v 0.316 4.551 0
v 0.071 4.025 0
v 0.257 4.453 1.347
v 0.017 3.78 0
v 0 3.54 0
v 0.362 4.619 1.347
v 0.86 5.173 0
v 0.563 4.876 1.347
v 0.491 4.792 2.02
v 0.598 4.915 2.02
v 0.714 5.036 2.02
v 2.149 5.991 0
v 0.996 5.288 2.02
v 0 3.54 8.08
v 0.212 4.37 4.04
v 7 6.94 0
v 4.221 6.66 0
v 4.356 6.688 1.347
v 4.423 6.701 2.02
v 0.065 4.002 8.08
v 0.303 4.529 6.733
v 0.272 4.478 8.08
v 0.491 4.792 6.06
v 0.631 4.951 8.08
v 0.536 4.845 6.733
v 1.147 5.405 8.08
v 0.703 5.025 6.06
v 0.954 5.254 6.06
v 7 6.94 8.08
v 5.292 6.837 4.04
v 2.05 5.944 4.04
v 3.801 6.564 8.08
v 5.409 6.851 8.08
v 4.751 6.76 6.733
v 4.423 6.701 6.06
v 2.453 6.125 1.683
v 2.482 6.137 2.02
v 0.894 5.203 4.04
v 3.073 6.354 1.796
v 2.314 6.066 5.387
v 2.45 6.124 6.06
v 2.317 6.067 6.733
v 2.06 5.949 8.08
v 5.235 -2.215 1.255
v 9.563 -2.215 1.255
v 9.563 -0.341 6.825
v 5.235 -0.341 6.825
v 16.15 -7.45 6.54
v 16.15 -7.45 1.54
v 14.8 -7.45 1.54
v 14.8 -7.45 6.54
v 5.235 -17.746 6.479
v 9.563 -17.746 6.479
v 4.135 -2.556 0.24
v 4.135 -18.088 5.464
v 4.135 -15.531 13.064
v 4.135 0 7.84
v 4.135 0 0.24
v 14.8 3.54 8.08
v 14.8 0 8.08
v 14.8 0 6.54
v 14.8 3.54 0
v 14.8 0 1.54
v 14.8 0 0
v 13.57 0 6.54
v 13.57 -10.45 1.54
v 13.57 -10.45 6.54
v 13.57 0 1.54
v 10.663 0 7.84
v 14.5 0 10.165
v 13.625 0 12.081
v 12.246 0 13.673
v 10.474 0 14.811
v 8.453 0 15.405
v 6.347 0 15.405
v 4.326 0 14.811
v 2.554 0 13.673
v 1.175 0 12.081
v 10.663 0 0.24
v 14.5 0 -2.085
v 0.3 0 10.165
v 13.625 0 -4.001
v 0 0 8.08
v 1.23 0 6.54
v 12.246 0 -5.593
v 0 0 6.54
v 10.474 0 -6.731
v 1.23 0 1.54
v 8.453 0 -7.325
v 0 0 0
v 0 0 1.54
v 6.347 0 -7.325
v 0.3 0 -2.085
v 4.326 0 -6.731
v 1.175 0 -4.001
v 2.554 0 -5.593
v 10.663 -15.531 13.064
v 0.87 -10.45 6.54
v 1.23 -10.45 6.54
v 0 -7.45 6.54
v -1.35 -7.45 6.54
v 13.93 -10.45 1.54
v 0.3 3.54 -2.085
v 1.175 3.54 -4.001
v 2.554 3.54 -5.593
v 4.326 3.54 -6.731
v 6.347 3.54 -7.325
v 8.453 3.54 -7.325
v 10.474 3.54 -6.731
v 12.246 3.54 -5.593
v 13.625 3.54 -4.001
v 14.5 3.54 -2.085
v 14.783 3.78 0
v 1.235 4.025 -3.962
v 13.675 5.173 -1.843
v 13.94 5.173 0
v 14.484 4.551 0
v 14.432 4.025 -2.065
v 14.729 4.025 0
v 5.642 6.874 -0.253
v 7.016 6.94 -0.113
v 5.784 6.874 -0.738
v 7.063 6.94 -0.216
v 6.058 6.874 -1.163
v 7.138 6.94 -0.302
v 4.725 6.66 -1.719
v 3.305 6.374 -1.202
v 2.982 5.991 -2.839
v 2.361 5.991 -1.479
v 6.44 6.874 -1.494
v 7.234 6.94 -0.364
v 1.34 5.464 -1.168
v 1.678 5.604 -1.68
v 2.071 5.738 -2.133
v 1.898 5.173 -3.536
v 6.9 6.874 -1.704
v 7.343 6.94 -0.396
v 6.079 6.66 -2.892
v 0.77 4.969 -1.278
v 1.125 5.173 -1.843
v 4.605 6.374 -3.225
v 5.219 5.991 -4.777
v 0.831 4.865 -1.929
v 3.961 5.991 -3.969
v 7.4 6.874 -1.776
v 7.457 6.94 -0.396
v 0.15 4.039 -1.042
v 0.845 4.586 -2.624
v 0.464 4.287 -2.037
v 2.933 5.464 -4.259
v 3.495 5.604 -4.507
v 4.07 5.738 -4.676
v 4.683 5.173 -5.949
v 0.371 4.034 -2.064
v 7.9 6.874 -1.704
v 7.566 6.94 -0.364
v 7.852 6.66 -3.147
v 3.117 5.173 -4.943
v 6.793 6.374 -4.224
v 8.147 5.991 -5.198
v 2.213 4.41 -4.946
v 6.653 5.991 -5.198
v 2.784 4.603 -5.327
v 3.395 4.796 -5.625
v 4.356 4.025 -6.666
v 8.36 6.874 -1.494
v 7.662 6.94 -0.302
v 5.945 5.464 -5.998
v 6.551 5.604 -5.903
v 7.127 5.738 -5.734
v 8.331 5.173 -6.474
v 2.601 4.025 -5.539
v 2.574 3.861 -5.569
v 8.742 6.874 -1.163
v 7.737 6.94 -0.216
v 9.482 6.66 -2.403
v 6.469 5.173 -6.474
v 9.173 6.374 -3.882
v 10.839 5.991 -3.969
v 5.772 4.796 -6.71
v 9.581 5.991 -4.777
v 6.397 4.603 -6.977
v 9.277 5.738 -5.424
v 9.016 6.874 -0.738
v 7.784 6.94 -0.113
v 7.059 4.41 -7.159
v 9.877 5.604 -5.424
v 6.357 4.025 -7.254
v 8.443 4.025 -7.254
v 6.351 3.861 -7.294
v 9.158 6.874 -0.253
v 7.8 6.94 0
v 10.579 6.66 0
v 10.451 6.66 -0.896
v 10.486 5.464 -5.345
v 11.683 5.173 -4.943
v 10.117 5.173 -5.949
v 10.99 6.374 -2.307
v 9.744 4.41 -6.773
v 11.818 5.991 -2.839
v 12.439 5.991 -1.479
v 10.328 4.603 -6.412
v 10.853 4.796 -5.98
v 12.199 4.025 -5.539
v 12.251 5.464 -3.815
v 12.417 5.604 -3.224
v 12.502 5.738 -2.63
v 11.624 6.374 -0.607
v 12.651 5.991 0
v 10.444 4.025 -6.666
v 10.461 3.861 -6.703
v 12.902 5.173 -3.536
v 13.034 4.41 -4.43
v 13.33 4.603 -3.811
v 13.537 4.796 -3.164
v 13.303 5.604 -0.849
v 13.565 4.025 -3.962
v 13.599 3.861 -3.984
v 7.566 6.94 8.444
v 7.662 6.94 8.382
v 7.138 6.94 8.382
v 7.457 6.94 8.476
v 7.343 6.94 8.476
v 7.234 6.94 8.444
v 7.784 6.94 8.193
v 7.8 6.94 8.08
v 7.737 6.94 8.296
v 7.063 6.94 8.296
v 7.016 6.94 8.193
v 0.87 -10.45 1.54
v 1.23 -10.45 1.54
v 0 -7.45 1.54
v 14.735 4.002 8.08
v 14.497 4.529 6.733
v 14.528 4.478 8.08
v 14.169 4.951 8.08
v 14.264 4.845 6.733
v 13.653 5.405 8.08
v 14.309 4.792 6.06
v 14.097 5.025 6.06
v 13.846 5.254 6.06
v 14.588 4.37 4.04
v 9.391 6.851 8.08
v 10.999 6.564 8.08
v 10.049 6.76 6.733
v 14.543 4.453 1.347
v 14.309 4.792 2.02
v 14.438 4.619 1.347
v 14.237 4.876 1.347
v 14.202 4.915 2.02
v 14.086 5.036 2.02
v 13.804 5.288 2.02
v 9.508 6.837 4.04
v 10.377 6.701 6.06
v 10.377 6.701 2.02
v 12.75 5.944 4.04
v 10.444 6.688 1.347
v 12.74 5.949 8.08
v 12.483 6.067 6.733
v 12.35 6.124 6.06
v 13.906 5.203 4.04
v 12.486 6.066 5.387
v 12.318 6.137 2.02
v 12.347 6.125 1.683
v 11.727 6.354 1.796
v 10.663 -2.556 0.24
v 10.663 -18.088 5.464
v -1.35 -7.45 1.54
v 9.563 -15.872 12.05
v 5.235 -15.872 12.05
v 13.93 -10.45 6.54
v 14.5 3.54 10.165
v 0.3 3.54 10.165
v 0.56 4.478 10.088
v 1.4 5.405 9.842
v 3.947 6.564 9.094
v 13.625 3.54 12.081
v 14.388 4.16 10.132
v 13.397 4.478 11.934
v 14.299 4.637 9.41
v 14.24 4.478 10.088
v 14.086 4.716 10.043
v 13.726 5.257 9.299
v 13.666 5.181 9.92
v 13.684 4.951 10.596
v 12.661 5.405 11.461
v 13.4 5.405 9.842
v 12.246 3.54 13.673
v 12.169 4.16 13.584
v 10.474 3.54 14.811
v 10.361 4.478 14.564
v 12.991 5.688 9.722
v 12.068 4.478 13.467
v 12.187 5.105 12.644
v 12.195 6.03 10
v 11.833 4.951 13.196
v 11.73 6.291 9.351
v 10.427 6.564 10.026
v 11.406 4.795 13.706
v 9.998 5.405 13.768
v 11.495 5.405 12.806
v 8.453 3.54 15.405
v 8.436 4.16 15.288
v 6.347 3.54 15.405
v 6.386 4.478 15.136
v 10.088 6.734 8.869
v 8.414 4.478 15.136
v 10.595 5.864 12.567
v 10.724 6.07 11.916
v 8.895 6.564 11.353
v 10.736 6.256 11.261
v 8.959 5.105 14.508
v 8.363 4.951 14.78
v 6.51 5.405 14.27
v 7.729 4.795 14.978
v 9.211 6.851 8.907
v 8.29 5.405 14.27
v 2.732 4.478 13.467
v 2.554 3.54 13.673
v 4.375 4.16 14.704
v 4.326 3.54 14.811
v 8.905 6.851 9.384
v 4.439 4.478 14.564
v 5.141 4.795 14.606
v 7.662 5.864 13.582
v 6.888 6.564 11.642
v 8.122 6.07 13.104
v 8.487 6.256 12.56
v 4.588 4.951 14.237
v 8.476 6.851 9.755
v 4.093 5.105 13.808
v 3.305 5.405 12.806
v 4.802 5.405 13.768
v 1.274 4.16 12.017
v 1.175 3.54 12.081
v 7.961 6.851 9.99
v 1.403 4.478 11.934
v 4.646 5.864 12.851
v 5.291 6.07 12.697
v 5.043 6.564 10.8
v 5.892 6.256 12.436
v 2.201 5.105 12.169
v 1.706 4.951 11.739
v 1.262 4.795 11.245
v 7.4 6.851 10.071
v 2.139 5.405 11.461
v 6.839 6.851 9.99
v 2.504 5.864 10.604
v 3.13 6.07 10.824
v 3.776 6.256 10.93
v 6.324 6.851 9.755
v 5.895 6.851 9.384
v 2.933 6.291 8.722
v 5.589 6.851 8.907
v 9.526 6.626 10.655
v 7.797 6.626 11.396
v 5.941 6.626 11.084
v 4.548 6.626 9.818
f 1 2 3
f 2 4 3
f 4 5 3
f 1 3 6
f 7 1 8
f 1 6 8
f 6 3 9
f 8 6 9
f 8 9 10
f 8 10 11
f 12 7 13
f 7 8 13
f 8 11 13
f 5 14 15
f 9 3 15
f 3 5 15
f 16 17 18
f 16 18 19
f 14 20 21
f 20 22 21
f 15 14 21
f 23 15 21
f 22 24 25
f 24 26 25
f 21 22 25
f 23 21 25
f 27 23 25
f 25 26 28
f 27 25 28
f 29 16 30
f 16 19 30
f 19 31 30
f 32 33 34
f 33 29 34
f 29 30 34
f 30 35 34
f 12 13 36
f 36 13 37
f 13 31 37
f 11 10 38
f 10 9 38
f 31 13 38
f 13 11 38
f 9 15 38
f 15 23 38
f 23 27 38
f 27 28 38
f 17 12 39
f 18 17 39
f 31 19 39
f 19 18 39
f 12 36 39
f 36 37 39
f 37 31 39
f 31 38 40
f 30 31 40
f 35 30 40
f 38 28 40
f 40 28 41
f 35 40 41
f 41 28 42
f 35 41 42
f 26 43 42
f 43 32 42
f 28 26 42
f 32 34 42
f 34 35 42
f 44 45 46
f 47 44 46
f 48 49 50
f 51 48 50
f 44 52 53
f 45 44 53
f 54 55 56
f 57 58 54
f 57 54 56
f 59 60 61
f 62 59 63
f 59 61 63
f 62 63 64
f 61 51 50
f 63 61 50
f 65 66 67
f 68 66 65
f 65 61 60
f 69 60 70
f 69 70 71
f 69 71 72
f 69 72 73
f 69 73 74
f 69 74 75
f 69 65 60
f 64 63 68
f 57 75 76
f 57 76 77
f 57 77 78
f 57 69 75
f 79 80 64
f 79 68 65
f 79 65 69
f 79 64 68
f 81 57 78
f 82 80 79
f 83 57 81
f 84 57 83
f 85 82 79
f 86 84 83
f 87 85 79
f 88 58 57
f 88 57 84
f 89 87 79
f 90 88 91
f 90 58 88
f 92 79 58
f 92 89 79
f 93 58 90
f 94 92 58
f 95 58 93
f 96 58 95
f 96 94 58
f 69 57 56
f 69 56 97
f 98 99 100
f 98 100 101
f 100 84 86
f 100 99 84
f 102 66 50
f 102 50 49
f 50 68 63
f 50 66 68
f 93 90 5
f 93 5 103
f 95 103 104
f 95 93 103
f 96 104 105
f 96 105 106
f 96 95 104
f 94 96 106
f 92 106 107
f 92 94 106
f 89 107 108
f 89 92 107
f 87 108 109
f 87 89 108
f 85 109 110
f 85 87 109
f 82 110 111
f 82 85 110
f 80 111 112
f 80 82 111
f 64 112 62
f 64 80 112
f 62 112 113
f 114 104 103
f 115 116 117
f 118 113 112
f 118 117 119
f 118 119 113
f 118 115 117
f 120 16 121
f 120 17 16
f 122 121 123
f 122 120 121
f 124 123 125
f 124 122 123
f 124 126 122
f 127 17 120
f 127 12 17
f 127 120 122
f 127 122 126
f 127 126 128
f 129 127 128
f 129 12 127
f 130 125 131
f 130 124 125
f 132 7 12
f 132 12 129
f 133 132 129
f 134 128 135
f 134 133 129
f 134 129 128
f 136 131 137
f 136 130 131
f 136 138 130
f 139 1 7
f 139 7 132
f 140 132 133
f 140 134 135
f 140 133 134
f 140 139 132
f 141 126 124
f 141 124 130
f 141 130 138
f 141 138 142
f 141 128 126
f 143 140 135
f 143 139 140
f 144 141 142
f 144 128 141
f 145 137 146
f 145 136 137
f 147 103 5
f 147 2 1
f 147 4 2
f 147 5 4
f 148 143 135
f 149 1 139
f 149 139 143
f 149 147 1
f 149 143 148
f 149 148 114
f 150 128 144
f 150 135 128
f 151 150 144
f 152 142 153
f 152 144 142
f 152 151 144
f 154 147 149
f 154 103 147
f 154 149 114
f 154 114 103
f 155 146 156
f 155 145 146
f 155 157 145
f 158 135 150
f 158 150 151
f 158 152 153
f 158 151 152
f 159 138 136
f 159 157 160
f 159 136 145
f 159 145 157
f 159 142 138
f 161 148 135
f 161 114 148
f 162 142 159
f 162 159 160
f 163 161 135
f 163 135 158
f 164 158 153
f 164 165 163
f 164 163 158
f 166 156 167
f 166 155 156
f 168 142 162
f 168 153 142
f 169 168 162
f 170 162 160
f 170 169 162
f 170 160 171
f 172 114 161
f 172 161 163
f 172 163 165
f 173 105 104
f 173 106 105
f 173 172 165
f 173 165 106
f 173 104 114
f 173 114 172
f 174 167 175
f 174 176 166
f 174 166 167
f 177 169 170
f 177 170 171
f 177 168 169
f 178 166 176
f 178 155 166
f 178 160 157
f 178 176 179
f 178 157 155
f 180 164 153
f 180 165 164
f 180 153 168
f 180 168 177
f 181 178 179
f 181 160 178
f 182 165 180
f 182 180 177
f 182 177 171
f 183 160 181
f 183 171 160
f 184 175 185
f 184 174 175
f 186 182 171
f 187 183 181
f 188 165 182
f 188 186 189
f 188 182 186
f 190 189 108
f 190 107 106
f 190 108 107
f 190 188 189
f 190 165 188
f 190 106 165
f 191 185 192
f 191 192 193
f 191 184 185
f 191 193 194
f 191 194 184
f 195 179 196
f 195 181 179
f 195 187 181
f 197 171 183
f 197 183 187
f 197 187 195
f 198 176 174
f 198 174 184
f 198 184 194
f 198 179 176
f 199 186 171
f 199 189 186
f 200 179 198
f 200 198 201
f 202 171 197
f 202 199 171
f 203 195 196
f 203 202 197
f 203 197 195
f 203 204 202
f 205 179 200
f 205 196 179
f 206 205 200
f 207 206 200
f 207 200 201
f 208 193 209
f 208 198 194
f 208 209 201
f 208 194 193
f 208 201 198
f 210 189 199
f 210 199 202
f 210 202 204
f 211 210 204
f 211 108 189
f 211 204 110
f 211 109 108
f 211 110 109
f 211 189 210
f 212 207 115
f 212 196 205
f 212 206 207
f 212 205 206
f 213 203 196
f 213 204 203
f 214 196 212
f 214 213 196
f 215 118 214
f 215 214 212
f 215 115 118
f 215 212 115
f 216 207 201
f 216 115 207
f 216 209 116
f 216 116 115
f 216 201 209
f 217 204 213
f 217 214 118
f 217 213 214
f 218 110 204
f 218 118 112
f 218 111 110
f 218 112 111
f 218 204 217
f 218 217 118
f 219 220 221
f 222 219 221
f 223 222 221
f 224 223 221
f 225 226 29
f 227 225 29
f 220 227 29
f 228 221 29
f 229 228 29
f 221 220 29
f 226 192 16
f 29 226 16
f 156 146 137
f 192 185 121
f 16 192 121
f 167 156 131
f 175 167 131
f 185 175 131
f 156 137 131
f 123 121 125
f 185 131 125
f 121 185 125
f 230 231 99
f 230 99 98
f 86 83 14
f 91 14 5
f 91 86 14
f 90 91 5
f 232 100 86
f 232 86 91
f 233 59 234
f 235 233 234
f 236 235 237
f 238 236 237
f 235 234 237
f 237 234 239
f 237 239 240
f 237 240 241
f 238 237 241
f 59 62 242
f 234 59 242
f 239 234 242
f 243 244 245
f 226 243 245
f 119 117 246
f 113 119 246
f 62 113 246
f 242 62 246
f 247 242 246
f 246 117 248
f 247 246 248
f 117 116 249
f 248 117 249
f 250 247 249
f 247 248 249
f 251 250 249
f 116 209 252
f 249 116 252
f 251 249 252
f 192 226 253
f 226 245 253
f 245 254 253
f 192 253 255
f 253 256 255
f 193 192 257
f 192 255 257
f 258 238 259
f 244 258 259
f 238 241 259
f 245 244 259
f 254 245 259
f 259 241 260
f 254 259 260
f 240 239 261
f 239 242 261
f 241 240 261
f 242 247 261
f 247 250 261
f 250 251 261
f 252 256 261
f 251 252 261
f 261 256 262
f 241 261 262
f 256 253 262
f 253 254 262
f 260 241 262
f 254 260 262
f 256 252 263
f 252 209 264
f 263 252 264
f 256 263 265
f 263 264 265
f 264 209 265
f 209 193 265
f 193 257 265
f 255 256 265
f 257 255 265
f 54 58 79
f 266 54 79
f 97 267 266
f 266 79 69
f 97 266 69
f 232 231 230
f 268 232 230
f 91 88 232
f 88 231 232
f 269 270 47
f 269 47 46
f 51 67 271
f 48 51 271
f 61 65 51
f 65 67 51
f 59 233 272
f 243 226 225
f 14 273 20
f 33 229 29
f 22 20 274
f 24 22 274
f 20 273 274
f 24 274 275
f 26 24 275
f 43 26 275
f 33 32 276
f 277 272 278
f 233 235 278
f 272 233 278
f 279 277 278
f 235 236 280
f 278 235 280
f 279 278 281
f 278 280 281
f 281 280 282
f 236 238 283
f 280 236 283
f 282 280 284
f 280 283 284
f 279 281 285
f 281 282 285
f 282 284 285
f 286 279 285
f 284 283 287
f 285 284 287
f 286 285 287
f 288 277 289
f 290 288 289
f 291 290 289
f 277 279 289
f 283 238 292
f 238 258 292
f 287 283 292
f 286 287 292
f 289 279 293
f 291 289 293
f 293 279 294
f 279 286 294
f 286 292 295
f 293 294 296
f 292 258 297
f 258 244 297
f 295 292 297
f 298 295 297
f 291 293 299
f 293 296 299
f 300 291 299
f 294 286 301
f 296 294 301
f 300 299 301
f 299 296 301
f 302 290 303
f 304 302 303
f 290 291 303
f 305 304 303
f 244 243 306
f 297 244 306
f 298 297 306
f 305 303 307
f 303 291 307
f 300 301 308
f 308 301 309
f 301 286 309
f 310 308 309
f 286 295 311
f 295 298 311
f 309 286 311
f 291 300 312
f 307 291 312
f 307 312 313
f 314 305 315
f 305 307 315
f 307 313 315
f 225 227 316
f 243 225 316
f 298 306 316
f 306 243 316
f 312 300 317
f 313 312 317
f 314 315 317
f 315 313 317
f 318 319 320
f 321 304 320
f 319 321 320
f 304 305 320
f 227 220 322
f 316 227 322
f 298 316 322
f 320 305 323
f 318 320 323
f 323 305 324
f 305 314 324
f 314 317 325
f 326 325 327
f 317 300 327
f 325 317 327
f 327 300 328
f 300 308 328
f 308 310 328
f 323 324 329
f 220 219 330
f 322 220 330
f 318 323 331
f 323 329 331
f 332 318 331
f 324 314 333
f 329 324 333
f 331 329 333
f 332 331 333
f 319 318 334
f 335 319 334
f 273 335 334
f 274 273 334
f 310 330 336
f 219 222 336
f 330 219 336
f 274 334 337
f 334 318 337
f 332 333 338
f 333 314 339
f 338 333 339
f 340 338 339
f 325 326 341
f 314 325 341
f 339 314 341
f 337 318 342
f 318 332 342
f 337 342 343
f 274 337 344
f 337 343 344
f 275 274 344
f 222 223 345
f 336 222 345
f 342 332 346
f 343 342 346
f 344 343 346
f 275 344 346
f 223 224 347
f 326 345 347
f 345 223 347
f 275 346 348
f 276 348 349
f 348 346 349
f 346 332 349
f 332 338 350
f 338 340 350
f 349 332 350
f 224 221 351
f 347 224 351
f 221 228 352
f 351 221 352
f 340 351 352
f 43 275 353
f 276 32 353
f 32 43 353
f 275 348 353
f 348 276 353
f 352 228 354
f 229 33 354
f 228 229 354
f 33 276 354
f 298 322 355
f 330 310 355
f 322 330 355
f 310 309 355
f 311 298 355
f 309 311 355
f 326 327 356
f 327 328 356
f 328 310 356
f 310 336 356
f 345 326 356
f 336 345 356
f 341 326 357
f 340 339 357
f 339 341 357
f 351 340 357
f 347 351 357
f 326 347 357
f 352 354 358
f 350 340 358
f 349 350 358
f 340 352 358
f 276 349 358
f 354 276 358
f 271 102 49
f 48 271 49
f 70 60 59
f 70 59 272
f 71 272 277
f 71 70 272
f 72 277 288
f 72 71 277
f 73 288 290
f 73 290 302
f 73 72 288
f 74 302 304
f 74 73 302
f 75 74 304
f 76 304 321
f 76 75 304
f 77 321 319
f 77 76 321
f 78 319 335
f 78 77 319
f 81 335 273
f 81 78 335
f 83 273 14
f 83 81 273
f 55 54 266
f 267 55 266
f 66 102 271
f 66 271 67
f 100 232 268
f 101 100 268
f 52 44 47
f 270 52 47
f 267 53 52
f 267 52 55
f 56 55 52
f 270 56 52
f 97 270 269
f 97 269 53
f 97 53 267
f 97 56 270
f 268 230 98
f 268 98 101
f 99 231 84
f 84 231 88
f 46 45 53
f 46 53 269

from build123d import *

# Parameters (mm, degrees)
SKETCH1_W           = 14.8
SKETCH1_H           = 8.08
BOSS_EXTRUDE1_DEPTH = 6.94
FILLET1_SIZE        = 7
FILLET1_SIZE_2      = 3.4
SKETCH2_W           = 2.5
SKETCH2_H           = 5
BOSS_EXTRUDE2_DEPTH = 7.45
SKETCH3_W           = 4.44
SKETCH3_H           = 5
BOSS_EXTRUDE3_DEPTH = 3
CUT_EXTRUDE1_REACH  = 26.161
CUT_EXTRUDE2_REACH  = 26.161
CUT_EXTRUDE3_REACH  = 25.756
SKETCH6_W           = 1.27
SKETCH6_H           = 10.45
SKETCH7_W           = 6.5278
SKETCH7_H           = 5
SKETCH7_H_2         = 1.3
BOSS_EXTRUDE4_DEPTH = 2.55634
CUT_EXTRUDE4_REACH  = 24.207
SKETCH9_W           = 6.5278
SKETCH9_H           = 8.018408457
SKETCH9_W_2         = 4.3283
SKETCH9_H_2         = 5.8777
BOSS_EXTRUDE5_DEPTH = 16.3863


with BuildPart() as part:
    # Sketch1 → Boss-Extrude1 (new body)
    with BuildSketch(Plane(origin=(0, 0, 0), x_dir=(1, 0, 0), z_dir=(0, 1, 0))):
        with BuildLine():
            Line((0, -8.08), (14.8, -8.08))
            ThreePointArc((14.8, -8.08), (7.4, -15.48), (0, -8.08))
        make_face()
        with Locations((7.4, -4.04)):
            Rectangle(SKETCH1_W, SKETCH1_H)
        with BuildLine():
            ThreePointArc((0, 0), (7.4, 7.4), (14.8, 0))
            Line((14.8, 0), (0, 0))
        make_face()
    extrude(amount=BOSS_EXTRUDE1_DEPTH)

    # Fillet1
    # an asymmetric fillet: 7, 3.4 mm, written as the material it takes off along each edge
    with BuildSketch(Plane(origin=(7.4, 6.94, 0), x_dir=(-1, 0, 0), z_dir=(0, 0, 1))) as fillet1_piece_1:
        with BuildLine():
            Bezier((7.4 - FILLET1_SIZE, 0), (7.4, 0), (7.4, FILLET1_SIZE_2), weights=[1, 0.707106781, 1])
            Line((7.4, FILLET1_SIZE_2), (7.4, 0))
            Line((7.4, 0), (7.4 - FILLET1_SIZE, 0))
        make_face()
    revolve(axis=Axis((7.4, 6.94, 0), (0, -1, 0)), revolution_arc=180, mode=Mode.SUBTRACT)
    with BuildSketch(Plane(origin=(0, 6.94, 8.08), x_dir=(0, -1, 0), z_dir=(0, 0, -1)), Plane(origin=(14.8, 6.94, 0), x_dir=(0, -1, 0), z_dir=(0, 0, 1))) as fillet1_piece_2:
        with BuildLine():
            Bezier((FILLET1_SIZE_2, 0), (0, 0), (0, -FILLET1_SIZE), weights=[1, 0.707106781, 1])
            Line((0, -FILLET1_SIZE), (0, 0))
            Line((0, 0), (FILLET1_SIZE_2, 0))
        make_face()
    extrude(amount=8.08, mode=Mode.SUBTRACT)
    with BuildSketch(Plane(origin=(7.4, 6.94, 8.08), x_dir=(1, 0, 0), z_dir=(0, 0, -1))) as fillet1_piece_3:
        with BuildLine():
            Bezier((7.4, FILLET1_SIZE_2), (7.4, 0), (7.4 - FILLET1_SIZE, 0), weights=[1, 0.707106781, 1])
            Line((7.4 - FILLET1_SIZE, 0), (7.4, 0))
            Line((7.4, 0), (7.4, FILLET1_SIZE_2))
        make_face()
    revolve(axis=Axis((7.4, 6.94, 8.08), (0, -1, 0)), revolution_arc=180, mode=Mode.SUBTRACT)

    # Sketch2 → Boss-Extrude2 (add)
    with BuildSketch(Plane.XZ):
        with Locations((1.25, 4.04)):
            Rectangle(SKETCH2_W, SKETCH2_H)
        with Locations((13.55, 4.04)):
            Rectangle(SKETCH2_W, SKETCH2_H)
    extrude(amount=BOSS_EXTRUDE2_DEPTH)

    # Sketch3 → Boss-Extrude3 (add)
    with BuildSketch(Plane(origin=(0, -7.45, 0), x_dir=(-1, 0, 0), z_dir=(0, -1, 0))):
        with Locations((-0.28, -4.04)):
            Rectangle(SKETCH3_W, SKETCH3_H)
        with Locations((-14.52, -4.04)):
            Rectangle(SKETCH3_W, SKETCH3_H)
    extrude(amount=BOSS_EXTRUDE3_DEPTH)

    # Sketch4 → Cut-Extrude1 (cut, up to next)
    with BuildSketch(Plane(origin=(0, 0, 1.54), x_dir=(-1, 0, 0), z_dir=(0, 0, -1)), mode=Mode.PRIVATE) as cut_extrude1_sk1:
        Polygon((1.94, -7.45), (-0.28, -10.45), (1.94, -10.45), align=None)
    cut_extrude1_tool1 = extrude(cut_extrude1_sk1.sketch, amount=-CUT_EXTRUDE1_REACH, mode=Mode.PRIVATE) & part.part
    # Sketch4 → Cut-Extrude1 (cut, up to next)
    with BuildSketch(Plane(origin=(0, 0, 1.54), x_dir=(-1, 0, 0), z_dir=(0, 0, -1)), mode=Mode.PRIVATE) as cut_extrude1_sk2:
        Polygon((-16.74, -7.45), (-16.74, -10.45), (-14.52, -10.45), align=None)
    cut_extrude1_tool2 = extrude(cut_extrude1_sk2.sketch, amount=-CUT_EXTRUDE1_REACH, mode=Mode.PRIVATE) & part.part
    add(cut_extrude1_tool1.solids().sort_by_distance((-1.2, -9.45, 1.54))[0], mode=Mode.SUBTRACT)
    add(cut_extrude1_tool2.solids().sort_by_distance((16, -9.45, 1.54))[0], mode=Mode.SUBTRACT)

    # Sketch5 → Cut-Extrude2 (cut, up to next)
    with BuildSketch(Plane(origin=(0, 0, 1.54), x_dir=(-1, 0, 0), z_dir=(0, 0, -1)), mode=Mode.PRIVATE) as cut_extrude2_sk1:
        Polygon((-0.28, -10.45), (-0.87, -10.45), (1.35, -7.45), (1.94, -7.45), align=None)
    cut_extrude2_tool1 = extrude(cut_extrude2_sk1.sketch, amount=-CUT_EXTRUDE2_REACH, mode=Mode.PRIVATE) & part.part
    # Sketch5 → Cut-Extrude2 (cut, up to next)
    with BuildSketch(Plane(origin=(0, 0, 1.54), x_dir=(-1, 0, 0), z_dir=(0, 0, -1)), mode=Mode.PRIVATE) as cut_extrude2_sk2:
        Polygon((-14.52, -10.45), (-13.93, -10.45), (-16.15, -7.45), (-16.74, -7.45), align=None)
    cut_extrude2_tool2 = extrude(cut_extrude2_sk2.sketch, amount=-CUT_EXTRUDE2_REACH, mode=Mode.PRIVATE) & part.part
    add(cut_extrude2_tool1.solids().sort_by_distance((-0.535, -8.95, 1.54))[0], mode=Mode.SUBTRACT)
    add(cut_extrude2_tool2.solids().sort_by_distance((15.335, -8.95, 1.54))[0], mode=Mode.SUBTRACT)

    # Sketch6 → Cut-Extrude3 (cut, up to next)
    with BuildSketch(Plane(origin=(0, 0, 1.54), x_dir=(-1, 0, 0), z_dir=(0, 0, -1)), mode=Mode.PRIVATE) as cut_extrude3_sk1:
        with Locations((-1.865, -5.225)):
            Rectangle(SKETCH6_W, SKETCH6_H)
    cut_extrude3_tool1 = extrude(cut_extrude3_sk1.sketch, amount=-CUT_EXTRUDE3_REACH, mode=Mode.PRIVATE) & part.part
    # Sketch6 → Cut-Extrude3 (cut, up to next)
    with BuildSketch(Plane(origin=(0, 0, 1.54), x_dir=(-1, 0, 0), z_dir=(0, 0, -1)), mode=Mode.PRIVATE) as cut_extrude3_sk2:
        with Locations((-12.935, -5.225)):
            Rectangle(SKETCH6_W, SKETCH6_H)
    cut_extrude3_tool2 = extrude(cut_extrude3_sk2.sketch, amount=-CUT_EXTRUDE3_REACH, mode=Mode.PRIVATE) & part.part
    add(cut_extrude3_tool1.solids().sort_by_distance((1.865, -5.225, 1.54))[0], mode=Mode.SUBTRACT)
    add(cut_extrude3_tool2.solids().sort_by_distance((12.935, -5.225, 1.54))[0], mode=Mode.SUBTRACT)

    # Sketch7 → Boss-Extrude4 (add)
    with BuildSketch(Plane.XZ):
        with Locations((7.3989, 4.04)):
            Rectangle(SKETCH7_W, SKETCH7_H)
        with Locations((7.3989, 0.89)):
            Rectangle(SKETCH7_W, SKETCH7_H_2)
        with Locations((7.3989, 7.19)):
            Rectangle(SKETCH7_W, SKETCH7_H_2)
    extrude(amount=BOSS_EXTRUDE4_DEPTH)

    # Sketch8 → Cut-Extrude4 (cut, up to next)
    with BuildSketch(Plane(origin=(10.6628, 0, 0), x_dir=(0, 0, -1), z_dir=(1, 0, 0)), mode=Mode.PRIVATE) as cut_extrude4_sk1:
        Polygon((-0.24, -2.55634), (-7.84, 0), (-7.84, -2.55634), align=None)
    cut_extrude4_tool1 = extrude(cut_extrude4_sk1.sketch, amount=-CUT_EXTRUDE4_REACH, mode=Mode.PRIVATE) & part.part
    add(cut_extrude4_tool1.solids().sort_by_distance((10.6628, -1.704227, 5.306667))[0], mode=Mode.SUBTRACT)

    # Sketch9 → Boss-Extrude5 (add)
    with BuildSketch(Plane(origin=(0, -2.369037415, 0.796850672), x_dir=(1, 0, 0), z_dir=(0, -0.9478190142131836, 0.31880890247285915))):
        with Locations((7.3989, 3.421696842)):
            Rectangle(SKETCH9_W, SKETCH9_H)
        with Locations((7.3989, 3.421696843)):
            Rectangle(SKETCH9_W_2, SKETCH9_H_2, mode=Mode.SUBTRACT)
    extrude(amount=BOSS_EXTRUDE5_DEPTH)


solid = part.part
